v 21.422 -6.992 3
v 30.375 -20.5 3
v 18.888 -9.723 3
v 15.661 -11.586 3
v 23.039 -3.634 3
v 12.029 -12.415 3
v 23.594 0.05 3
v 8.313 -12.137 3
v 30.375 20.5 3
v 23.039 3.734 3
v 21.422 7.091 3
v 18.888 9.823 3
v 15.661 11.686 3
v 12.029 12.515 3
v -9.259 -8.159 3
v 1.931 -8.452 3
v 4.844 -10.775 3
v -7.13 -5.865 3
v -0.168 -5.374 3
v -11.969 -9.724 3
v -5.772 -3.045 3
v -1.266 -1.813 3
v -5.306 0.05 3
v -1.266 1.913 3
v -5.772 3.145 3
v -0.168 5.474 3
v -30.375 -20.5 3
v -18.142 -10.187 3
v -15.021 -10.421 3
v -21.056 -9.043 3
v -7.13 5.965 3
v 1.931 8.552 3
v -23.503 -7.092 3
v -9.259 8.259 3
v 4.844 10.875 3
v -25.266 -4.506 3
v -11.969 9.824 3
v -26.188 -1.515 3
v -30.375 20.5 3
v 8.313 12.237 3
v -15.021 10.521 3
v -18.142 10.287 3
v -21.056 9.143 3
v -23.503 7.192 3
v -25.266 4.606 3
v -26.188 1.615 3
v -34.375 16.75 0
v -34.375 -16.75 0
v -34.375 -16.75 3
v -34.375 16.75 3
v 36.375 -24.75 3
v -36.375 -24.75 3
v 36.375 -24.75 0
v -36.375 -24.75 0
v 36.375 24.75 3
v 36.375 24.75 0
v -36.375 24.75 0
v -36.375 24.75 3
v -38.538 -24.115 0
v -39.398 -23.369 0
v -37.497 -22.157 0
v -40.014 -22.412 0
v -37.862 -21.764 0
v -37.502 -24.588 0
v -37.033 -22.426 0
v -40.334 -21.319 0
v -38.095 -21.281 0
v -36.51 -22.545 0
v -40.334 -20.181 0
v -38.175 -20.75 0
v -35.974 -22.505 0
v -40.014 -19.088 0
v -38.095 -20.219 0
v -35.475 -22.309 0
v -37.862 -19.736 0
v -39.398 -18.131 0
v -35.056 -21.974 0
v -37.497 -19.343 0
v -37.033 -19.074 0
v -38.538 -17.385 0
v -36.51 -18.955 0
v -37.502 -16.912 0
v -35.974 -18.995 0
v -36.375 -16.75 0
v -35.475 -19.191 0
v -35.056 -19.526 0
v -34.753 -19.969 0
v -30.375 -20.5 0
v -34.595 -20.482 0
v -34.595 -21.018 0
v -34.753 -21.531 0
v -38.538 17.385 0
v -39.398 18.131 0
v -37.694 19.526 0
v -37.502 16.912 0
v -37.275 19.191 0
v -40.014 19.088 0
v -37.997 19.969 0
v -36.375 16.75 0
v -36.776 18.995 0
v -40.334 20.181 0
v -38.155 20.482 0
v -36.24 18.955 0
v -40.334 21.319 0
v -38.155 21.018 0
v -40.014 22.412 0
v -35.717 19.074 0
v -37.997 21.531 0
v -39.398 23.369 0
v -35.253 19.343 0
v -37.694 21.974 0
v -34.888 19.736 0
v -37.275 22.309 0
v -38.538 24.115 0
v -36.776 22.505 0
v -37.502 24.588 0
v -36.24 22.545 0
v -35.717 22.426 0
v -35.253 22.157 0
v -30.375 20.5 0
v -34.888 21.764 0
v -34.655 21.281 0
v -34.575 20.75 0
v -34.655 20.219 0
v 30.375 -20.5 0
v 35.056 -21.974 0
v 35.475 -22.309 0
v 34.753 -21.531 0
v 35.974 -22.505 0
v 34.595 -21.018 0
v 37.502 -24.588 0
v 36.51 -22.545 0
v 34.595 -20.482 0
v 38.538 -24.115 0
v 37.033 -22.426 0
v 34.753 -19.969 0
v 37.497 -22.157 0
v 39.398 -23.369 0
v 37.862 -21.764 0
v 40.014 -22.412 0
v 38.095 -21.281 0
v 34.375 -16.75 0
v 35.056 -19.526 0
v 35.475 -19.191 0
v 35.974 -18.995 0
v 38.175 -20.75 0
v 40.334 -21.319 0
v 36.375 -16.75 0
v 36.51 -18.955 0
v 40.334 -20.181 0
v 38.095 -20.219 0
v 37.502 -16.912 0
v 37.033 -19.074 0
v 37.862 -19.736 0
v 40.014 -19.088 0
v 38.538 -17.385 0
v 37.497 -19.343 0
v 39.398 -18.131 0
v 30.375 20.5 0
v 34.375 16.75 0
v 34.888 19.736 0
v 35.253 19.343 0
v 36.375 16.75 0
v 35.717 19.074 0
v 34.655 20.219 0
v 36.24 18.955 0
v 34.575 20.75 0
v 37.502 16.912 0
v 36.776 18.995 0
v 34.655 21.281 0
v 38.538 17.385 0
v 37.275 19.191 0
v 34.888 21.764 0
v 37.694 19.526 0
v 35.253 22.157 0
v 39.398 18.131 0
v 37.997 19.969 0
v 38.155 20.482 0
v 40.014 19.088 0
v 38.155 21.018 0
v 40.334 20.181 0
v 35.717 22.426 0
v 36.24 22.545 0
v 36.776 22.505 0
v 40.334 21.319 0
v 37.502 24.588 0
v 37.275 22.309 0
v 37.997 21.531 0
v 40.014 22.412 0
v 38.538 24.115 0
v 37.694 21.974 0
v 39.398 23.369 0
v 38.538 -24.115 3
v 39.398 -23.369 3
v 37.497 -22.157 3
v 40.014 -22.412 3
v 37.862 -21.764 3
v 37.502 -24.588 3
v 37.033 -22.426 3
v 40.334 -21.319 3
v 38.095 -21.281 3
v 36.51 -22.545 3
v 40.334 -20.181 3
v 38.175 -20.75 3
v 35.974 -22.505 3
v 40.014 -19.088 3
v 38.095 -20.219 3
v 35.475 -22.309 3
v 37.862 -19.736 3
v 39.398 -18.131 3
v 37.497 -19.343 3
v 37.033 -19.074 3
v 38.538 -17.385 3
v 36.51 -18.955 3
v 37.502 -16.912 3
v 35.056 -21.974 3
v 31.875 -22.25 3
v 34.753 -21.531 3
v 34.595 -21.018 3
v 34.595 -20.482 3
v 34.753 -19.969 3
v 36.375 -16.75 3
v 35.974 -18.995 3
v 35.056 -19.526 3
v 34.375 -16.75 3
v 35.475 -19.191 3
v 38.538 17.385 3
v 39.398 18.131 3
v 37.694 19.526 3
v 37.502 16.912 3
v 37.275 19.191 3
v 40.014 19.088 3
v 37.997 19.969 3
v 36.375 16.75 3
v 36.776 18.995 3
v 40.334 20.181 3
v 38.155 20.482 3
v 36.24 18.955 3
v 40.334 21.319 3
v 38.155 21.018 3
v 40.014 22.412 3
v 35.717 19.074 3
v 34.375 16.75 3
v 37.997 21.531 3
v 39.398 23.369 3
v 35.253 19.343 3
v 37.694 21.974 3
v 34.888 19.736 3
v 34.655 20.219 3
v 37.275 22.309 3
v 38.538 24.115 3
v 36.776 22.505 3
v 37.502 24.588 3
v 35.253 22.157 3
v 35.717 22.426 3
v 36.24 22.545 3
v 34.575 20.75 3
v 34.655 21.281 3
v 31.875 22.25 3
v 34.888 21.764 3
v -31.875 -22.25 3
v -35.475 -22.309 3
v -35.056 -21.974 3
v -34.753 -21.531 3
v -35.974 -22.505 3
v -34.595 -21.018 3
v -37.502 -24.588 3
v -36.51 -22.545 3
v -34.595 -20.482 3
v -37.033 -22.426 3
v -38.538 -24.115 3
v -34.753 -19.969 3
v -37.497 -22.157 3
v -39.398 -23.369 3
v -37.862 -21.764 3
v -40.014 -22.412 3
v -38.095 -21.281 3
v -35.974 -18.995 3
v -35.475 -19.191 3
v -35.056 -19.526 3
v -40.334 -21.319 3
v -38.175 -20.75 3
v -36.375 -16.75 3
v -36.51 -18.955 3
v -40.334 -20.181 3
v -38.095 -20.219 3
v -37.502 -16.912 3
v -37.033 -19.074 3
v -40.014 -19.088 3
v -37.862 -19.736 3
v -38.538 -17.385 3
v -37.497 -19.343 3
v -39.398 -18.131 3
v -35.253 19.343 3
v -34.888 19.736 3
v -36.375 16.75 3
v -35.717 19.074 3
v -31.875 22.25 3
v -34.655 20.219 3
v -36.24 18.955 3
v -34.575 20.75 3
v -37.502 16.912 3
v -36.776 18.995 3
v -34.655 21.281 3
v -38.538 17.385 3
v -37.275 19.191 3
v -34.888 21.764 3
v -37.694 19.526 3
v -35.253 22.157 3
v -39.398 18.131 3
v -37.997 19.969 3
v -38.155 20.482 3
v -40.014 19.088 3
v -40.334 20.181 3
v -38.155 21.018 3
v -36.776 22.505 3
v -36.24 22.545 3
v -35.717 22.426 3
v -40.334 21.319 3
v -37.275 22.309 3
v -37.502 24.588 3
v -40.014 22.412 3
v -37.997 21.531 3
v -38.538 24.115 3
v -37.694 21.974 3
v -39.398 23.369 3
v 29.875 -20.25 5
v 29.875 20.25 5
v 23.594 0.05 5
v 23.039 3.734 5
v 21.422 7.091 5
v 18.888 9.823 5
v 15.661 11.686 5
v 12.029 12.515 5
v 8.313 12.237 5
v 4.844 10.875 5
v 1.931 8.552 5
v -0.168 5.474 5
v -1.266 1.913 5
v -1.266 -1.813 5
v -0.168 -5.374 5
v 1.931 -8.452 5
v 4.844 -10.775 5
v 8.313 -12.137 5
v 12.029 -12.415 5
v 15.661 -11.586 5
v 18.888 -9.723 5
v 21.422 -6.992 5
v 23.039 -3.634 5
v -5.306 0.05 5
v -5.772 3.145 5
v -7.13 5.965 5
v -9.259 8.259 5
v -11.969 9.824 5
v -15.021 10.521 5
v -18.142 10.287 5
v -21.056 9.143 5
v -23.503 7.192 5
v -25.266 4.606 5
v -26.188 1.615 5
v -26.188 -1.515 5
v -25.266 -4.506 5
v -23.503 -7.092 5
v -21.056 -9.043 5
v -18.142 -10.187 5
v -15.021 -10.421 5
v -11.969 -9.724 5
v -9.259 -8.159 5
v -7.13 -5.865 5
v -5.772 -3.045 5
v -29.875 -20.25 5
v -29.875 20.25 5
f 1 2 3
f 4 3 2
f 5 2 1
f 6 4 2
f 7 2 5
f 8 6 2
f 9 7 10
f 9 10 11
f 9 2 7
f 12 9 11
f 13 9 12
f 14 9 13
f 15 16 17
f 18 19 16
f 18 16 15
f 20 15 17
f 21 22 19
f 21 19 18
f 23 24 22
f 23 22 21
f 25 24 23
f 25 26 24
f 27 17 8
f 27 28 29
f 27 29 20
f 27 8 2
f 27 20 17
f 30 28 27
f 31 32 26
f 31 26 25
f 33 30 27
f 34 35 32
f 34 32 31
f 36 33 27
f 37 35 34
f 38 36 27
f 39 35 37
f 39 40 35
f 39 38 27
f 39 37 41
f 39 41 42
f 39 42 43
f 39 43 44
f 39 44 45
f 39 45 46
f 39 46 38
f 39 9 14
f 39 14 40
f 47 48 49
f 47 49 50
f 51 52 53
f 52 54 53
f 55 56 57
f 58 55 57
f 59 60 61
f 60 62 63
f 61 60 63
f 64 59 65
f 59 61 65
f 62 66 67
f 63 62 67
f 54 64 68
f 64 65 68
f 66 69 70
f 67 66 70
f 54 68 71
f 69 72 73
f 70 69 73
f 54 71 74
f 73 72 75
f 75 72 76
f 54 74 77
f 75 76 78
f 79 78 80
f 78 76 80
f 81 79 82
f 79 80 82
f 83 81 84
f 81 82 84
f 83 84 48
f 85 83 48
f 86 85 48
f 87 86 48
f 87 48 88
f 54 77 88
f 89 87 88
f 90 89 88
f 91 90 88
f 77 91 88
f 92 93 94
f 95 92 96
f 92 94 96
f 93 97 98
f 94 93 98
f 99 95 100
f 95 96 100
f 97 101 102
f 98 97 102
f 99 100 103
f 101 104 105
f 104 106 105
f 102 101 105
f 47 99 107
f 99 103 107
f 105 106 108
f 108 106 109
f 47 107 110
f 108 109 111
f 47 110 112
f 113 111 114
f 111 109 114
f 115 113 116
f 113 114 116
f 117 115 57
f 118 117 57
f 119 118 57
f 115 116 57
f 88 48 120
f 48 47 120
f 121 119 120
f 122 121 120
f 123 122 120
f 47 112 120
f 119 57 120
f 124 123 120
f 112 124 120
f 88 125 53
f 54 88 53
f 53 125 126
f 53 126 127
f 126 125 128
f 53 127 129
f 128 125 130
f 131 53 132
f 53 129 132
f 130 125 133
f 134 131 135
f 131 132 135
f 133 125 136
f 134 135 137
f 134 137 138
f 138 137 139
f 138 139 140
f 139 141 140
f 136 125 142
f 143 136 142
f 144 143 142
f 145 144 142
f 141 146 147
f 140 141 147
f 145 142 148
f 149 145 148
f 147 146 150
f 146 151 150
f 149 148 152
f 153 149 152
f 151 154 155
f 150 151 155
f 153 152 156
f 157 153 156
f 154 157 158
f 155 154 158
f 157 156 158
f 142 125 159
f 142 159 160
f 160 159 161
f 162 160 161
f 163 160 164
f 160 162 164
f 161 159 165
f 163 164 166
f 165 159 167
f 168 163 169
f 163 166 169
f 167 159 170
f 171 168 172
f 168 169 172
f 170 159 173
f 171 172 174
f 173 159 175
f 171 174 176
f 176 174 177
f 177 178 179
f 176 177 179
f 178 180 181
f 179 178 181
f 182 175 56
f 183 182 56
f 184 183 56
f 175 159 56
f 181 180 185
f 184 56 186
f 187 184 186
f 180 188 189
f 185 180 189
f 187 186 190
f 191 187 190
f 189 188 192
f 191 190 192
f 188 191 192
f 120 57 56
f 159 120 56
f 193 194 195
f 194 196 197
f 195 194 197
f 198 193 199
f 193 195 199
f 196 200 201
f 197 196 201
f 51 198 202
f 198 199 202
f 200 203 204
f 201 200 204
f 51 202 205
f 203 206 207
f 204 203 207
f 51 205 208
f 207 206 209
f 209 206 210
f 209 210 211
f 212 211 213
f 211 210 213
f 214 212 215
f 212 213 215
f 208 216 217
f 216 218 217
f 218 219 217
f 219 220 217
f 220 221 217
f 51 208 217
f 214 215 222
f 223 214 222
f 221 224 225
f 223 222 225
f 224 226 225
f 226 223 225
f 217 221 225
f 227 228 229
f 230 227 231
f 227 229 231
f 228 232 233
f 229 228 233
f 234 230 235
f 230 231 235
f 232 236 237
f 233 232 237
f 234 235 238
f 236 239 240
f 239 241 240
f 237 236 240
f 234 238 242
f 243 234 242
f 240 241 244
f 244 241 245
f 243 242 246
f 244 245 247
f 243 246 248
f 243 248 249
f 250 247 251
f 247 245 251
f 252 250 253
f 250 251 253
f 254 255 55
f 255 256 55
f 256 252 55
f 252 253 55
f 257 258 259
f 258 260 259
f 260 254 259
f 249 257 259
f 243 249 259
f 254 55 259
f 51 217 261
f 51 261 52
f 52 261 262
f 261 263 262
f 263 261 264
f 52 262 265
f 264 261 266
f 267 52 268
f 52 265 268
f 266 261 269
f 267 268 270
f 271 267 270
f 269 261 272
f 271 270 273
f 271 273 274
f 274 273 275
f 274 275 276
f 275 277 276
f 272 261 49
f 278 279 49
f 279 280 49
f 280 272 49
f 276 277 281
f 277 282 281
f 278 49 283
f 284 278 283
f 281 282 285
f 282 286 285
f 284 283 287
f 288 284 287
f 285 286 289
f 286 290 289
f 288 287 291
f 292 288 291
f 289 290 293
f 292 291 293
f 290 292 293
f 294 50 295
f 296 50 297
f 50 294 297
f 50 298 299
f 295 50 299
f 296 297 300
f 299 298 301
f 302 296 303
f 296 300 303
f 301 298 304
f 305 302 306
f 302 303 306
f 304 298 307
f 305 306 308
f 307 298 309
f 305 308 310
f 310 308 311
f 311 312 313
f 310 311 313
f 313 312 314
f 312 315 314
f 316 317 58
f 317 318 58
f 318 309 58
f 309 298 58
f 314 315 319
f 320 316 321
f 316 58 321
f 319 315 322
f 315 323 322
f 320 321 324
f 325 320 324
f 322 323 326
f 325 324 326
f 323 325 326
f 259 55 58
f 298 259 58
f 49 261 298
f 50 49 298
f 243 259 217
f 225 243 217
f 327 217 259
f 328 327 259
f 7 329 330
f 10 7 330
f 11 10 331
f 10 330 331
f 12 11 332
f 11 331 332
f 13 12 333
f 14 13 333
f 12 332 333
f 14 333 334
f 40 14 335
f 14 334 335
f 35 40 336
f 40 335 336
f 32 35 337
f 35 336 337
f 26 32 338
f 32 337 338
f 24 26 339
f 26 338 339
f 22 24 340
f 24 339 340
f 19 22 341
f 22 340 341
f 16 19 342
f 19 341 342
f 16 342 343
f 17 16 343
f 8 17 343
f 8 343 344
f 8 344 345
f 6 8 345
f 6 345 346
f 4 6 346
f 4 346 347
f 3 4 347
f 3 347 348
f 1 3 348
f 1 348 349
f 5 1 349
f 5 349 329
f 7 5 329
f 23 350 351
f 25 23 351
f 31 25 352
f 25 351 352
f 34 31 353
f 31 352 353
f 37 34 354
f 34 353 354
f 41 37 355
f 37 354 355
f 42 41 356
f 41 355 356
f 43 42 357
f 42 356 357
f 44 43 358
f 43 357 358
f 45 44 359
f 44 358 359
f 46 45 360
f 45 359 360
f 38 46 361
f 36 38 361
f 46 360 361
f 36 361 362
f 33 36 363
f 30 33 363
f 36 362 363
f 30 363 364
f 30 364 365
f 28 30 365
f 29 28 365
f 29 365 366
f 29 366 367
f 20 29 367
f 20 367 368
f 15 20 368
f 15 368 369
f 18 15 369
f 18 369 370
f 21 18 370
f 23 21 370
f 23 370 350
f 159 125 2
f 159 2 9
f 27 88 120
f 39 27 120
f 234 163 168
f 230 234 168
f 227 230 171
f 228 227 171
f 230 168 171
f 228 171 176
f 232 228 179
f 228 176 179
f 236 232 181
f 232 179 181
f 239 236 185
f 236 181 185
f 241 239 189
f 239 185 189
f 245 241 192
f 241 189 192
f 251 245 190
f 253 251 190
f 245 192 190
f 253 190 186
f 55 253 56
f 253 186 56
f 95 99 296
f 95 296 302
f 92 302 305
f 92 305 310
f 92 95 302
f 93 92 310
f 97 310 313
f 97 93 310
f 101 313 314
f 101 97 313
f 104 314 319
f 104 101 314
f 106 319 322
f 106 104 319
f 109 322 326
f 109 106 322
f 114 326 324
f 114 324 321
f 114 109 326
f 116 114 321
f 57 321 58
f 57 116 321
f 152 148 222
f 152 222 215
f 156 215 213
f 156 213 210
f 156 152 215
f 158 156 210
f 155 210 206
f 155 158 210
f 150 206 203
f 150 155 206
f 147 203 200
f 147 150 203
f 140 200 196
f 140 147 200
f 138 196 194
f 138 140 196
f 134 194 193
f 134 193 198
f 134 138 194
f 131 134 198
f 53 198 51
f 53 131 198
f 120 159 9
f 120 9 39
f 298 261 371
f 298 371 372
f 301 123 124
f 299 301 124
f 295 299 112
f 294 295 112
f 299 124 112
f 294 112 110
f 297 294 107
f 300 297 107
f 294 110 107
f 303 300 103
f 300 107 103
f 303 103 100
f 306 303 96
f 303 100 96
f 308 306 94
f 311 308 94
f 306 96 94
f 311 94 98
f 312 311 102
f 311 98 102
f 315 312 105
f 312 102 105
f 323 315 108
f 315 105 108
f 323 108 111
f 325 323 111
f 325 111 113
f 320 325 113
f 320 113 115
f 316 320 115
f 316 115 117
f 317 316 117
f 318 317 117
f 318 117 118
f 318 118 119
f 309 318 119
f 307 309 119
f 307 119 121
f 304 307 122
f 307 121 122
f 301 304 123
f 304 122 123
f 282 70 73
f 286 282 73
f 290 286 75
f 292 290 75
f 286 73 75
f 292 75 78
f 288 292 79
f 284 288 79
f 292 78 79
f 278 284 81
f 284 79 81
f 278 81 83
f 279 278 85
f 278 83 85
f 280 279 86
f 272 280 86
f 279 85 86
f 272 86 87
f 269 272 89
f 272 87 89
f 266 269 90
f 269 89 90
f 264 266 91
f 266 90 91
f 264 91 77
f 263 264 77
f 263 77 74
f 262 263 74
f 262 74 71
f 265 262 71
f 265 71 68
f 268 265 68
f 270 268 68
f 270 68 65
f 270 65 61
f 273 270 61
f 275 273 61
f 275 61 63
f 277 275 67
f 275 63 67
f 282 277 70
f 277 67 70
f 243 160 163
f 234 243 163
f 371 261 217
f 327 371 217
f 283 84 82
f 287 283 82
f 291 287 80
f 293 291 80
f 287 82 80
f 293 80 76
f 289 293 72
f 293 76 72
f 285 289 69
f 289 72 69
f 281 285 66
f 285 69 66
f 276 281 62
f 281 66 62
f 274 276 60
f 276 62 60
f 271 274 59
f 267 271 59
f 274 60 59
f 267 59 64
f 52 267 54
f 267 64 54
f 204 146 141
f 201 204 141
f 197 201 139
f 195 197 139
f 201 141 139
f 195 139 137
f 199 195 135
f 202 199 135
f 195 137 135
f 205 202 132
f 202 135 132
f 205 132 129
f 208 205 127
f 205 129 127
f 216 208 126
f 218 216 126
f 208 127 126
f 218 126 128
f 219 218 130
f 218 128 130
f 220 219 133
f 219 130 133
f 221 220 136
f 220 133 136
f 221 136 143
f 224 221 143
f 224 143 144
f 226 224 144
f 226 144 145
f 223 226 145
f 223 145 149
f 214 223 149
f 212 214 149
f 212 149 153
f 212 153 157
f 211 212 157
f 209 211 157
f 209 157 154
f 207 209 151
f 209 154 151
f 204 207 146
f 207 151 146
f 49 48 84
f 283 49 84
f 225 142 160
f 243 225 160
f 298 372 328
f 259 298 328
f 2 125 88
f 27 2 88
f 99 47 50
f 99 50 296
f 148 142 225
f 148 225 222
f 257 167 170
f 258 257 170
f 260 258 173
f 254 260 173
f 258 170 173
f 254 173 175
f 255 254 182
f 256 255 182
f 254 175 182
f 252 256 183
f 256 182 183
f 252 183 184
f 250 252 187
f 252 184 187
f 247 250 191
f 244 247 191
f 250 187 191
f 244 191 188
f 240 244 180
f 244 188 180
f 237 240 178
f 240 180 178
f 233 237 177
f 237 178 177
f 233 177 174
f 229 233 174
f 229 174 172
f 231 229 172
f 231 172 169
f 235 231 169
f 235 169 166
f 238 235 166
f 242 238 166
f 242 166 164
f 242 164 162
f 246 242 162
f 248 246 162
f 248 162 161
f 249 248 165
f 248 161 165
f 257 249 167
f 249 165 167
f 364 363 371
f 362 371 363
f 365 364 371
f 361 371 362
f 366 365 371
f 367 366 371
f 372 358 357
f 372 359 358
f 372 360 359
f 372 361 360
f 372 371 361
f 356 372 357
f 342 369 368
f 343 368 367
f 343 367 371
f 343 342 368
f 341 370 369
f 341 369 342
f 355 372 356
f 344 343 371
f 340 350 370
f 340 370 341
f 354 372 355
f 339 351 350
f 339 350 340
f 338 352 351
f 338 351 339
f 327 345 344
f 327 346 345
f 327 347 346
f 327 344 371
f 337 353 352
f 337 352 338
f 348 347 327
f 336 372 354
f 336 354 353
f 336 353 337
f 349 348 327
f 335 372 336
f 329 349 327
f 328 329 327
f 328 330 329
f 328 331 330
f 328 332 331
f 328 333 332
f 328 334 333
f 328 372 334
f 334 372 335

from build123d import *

# Parameters (mm, degrees)
ESBO_O1_W                = 68.75
ESBO_O1_H                = 49.5
RESSALTO_EXTRUS_O1_DEPTH = 5
ESBO_O2_W                = 60.75
ESBO_O2_H                = 41
CORTE_EXTRUS_O1_DEPTH    = 3
ESBO_O3_R                = 1.8
RESSALTO_EXTRUS_O2_DEPTH = 3
ESBO_O4_W                = 68.75
ESBO_O4_H                = 49.5
ESBO_O4_W_2              = 63.75
ESBO_O4_H_2              = 44.5
CORTE_EXTRUS_O2_DEPTH    = 2
CHANFRO1_SIZE            = 2
ESBO_O6_R                = 10.499996118
ESBO_O6_R_2              = 12.499999064
CORTE_EXTRUS_O4_DEPTH    = 48.620406603


with BuildPart() as part:
    # Esboço1 → Ressalto-extrusão1 (new body)
    with BuildSketch(Plane.XY):
        Rectangle(ESBO_O1_W, ESBO_O1_H)
    extrude(amount=RESSALTO_EXTRUS_O1_DEPTH)

    # Esboço2 → Corte-extrusão1 (cut)
    with BuildSketch(Plane(origin=(0, 0, 0), x_dir=(-1, 0, 0), z_dir=(0, 0, -1))):
        Rectangle(ESBO_O2_W, ESBO_O2_H)
    extrude(amount=-CORTE_EXTRUS_O1_DEPTH, mode=Mode.SUBTRACT)

    # Esboço3 → Ressalto-extrusão2 (add)
    # profile 1 of 4: a face of its own
    with BuildSketch(Plane(origin=(0, 0, 0), x_dir=(-1, 0, 0), z_dir=(0, 0, -1))):
        with BuildLine():
            Line((-36.375, 24.75), (-34.375, 24.75))
            Line((-34.375, 24.75), (-34.375, 16.75))
            Line((-34.375, 16.75), (-36.375, 16.75))
            ThreePointArc((-36.375, 16.75), (-40.375, 20.75), (-36.375, 24.75))
        make_face()
        with Locations((-36.375, 20.75)):
            Circle(ESBO_O3_R, mode=Mode.SUBTRACT)
    # profile 2 of 4: a face of its own
    with BuildSketch(Plane(origin=(0, 0, 0), x_dir=(-1, 0, 0), z_dir=(0, 0, -1))):
        with BuildLine():
            Line((34.375, 16.75), (36.375, 16.75))
            ThreePointArc((36.375, 16.75), (40.375, 20.75), (36.375, 24.75))
            Line((36.375, 24.75), (34.375, 24.75))
            Line((34.375, 24.75), (34.375, 16.75))
        make_face()
        with Locations(Location((36.375, 20.75, 0), (0, 0, 180))):
            Circle(ESBO_O3_R, mode=Mode.SUBTRACT)
    # profile 3 of 4: a face of its own
    with BuildSketch(Plane(origin=(0, 0, 0), x_dir=(-1, 0, 0), z_dir=(0, 0, -1))):
        with BuildLine():
            Line((36.375, -24.75), (34.375, -24.75))
            Line((34.375, -24.75), (34.375, -16.75))
            Line((34.375, -16.75), (36.375, -16.75))
            ThreePointArc((36.375, -16.75), (40.375, -20.75), (36.375, -24.75))
        make_face()
        with Locations((36.375, -20.75)):
            Circle(ESBO_O3_R, mode=Mode.SUBTRACT)
    # profile 4 of 4: a face of its own
    with BuildSketch(Plane(origin=(0, 0, 0), x_dir=(-1, 0, 0), z_dir=(0, 0, -1))):
        with BuildLine():
            Line((-34.375, -16.75), (-36.375, -16.75))
            ThreePointArc((-36.375, -16.75), (-40.375, -20.75), (-36.375, -24.75))
            Line((-36.375, -24.75), (-34.375, -24.75))
            Line((-34.375, -24.75), (-34.375, -16.75))
        make_face()
        with Locations(Location((-36.375, -20.75, 0), (0, 0, 180))):
            Circle(ESBO_O3_R, mode=Mode.SUBTRACT)
    extrude(amount=-RESSALTO_EXTRUS_O2_DEPTH)

    # Esboço4 → Corte-extrusão2 (cut)
    with BuildSketch(Plane.XY.offset(5)):
        Rectangle(ESBO_O4_W, ESBO_O4_H)
        Rectangle(ESBO_O4_W_2, ESBO_O4_H_2, mode=Mode.SUBTRACT)
    extrude(amount=-CORTE_EXTRUS_O2_DEPTH, mode=Mode.SUBTRACT)

    # Chanfro1
    chanfro1_edges = [part.edges().sort_by_distance(p)[0] for p in [
        (31.875, 0, 5),
        (0, -22.25, 5),
        (-31.875, 0, 5),
        (0, 22.25, 5),
    ]]
    chamfer(chanfro1_edges, length=CHANFRO1_SIZE - 0.0001)  # a hair under: the kernel refuses the full size

    # Esboço6 → Corte-extrusão4 (cut, through all)
    with BuildSketch(Plane.XY.offset(5)):
        with Locations((-15.805529429, 0.050006416)):
            Circle(ESBO_O6_R)
        with Locations((11.094471539, 0.049998219)):
            Circle(ESBO_O6_R_2)
    extrude(amount=-CORTE_EXTRUS_O4_DEPTH, mode=Mode.SUBTRACT)


solid = part.part
